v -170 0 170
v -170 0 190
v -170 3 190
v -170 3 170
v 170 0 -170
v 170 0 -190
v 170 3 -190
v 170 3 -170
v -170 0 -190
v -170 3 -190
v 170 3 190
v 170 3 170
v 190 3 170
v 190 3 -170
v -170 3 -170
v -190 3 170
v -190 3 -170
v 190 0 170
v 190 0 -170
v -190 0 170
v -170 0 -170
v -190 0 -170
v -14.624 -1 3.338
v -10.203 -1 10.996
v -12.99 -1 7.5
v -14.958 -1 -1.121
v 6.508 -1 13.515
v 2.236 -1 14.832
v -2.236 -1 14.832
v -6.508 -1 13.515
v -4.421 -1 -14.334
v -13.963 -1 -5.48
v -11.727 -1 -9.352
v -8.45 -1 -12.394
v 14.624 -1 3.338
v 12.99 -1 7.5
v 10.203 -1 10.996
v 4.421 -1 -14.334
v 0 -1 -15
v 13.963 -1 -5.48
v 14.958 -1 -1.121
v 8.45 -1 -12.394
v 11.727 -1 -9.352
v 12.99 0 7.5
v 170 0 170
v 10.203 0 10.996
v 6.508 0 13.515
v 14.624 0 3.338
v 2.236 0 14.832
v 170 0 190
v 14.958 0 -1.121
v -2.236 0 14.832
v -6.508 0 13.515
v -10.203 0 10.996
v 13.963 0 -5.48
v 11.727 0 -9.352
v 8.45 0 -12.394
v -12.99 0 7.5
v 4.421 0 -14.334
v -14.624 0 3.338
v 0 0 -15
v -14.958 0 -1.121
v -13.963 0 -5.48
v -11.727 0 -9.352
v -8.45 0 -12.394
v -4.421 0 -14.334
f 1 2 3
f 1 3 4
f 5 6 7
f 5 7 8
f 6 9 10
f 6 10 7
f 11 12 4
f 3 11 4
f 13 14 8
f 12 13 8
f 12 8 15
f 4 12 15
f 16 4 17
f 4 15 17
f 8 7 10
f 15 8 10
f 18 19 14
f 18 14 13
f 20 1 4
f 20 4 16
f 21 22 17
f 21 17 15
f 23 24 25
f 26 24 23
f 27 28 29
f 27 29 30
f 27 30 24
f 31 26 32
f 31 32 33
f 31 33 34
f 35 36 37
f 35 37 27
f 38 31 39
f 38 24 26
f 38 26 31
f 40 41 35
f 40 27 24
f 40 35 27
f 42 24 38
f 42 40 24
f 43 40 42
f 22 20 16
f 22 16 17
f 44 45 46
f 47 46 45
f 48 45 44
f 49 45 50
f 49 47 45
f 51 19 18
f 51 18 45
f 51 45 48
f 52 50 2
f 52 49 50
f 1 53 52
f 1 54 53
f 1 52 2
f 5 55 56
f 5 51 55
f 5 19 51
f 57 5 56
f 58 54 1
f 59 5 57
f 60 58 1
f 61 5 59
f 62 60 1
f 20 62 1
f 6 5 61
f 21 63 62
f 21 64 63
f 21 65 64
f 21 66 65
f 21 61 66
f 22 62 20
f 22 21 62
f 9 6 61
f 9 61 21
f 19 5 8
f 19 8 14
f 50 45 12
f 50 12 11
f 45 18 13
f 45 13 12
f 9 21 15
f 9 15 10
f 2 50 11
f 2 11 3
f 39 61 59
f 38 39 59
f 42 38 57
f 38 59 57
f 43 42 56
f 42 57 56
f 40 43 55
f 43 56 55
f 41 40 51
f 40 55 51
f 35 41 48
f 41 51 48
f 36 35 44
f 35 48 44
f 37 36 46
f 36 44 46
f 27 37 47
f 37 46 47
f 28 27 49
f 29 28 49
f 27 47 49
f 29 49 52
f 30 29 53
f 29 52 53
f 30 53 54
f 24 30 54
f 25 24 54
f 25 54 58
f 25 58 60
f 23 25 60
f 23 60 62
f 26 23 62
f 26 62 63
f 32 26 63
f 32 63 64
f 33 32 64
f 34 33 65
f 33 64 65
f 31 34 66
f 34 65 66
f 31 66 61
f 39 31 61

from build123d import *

# Parameters (mm, degrees)
EXTRUDE_3_DEPTH = 3
SKETCH_4_R      = 15
EXTRUDE_4_DEPTH = 1


with BuildPart() as part:
    # 草图3 → 凸台-拉伸3 (new body)
    with BuildSketch(Plane(origin=(0, 0, 0), x_dir=(1, 0, 0), z_dir=(0, 1, 0))):
        Polygon((170, 190), (170, 170), (190, 170), (190, -170), (170, -170), (170, -190), (-170, -190), (-170, -170), (-190, -170), (-190, 170), (-170, 170), (-170, 190), align=None)
    extrude(amount=EXTRUDE_3_DEPTH)

    # 草图4 → 凸台-拉伸4 (add)
    with BuildSketch(Plane.XZ):
        with Locations(Location((0, 0, 0), (0, 0, 270))):
            Circle(SKETCH_4_R)
    extrude(amount=EXTRUDE_4_DEPTH)


solid = part.part
